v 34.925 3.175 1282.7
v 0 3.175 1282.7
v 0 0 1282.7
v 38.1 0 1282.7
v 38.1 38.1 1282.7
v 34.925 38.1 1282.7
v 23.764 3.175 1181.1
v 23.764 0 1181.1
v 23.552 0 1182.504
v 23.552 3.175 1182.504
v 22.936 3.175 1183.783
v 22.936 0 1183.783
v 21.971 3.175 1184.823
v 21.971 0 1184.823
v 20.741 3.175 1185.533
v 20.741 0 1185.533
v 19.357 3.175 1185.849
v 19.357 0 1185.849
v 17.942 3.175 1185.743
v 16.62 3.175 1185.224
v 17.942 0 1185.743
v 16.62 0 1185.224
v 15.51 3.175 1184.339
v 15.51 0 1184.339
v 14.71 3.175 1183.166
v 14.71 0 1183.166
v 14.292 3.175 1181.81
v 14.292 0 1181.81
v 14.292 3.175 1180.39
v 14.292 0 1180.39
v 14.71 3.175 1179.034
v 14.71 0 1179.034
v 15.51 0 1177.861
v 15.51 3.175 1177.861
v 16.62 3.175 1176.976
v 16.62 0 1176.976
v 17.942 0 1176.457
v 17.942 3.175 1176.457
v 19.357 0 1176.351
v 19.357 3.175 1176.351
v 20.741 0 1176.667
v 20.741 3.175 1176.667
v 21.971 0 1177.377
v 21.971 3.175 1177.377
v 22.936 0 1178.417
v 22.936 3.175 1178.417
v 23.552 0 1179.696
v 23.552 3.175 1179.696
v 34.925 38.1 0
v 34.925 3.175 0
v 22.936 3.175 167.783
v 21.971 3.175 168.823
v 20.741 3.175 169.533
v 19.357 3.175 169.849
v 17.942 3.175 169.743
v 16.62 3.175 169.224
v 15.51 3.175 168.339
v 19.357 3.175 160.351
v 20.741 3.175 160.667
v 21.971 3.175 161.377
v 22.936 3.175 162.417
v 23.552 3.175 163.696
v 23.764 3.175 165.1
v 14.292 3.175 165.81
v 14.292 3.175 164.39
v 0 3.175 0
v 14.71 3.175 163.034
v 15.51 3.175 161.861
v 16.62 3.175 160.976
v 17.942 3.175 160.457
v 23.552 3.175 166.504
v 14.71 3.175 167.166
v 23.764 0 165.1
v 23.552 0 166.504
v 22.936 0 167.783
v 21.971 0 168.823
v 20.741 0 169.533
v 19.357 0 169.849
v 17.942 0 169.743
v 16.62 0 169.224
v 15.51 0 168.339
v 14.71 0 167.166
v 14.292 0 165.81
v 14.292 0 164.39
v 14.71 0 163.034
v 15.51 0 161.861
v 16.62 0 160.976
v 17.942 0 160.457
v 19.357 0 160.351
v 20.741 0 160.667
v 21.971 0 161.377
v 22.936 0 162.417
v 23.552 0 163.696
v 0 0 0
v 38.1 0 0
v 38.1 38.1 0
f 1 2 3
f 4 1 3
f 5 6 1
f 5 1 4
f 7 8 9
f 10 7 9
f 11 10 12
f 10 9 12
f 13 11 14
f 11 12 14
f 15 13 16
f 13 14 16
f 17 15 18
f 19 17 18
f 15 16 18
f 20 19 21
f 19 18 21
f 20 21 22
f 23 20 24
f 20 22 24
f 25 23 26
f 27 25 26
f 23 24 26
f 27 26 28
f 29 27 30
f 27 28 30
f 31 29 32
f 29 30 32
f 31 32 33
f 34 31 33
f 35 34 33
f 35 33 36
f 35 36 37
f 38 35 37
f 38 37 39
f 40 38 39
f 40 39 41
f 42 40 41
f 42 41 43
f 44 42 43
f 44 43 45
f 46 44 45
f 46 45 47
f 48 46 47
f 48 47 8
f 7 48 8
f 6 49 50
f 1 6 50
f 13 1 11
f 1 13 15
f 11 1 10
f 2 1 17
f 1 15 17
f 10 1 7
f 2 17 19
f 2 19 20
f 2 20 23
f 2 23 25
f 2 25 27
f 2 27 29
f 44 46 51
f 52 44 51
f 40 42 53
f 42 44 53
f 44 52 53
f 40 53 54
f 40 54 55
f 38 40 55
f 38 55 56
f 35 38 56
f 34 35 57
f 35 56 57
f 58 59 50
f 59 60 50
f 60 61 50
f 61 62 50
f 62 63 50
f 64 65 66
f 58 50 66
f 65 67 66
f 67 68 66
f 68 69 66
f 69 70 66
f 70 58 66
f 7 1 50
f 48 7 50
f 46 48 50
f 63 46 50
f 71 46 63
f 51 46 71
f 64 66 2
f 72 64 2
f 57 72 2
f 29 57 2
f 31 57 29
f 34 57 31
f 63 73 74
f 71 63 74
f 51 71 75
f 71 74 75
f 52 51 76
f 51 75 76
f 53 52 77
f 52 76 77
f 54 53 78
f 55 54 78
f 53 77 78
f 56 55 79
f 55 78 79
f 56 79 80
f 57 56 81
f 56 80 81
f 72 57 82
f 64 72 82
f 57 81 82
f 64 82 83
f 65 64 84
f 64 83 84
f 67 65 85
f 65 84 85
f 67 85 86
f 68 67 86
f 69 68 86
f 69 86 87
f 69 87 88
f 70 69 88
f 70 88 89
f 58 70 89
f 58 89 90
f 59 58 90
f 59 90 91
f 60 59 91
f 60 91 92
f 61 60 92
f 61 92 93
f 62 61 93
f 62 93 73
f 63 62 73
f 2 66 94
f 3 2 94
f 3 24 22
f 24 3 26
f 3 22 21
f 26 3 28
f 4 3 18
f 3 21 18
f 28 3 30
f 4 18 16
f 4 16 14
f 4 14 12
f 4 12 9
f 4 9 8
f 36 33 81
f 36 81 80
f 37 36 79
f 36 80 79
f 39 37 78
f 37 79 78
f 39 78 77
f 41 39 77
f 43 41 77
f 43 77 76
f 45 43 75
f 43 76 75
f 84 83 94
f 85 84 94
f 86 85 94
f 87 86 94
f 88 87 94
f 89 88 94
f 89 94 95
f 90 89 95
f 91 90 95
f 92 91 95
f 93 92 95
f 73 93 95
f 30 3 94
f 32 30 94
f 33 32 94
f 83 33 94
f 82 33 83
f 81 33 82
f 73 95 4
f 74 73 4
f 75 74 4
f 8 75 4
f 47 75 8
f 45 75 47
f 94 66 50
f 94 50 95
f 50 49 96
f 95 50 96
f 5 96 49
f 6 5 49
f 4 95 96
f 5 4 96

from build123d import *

# Parameters (mm, degrees)
F1_DEPTH = 1282.7
F2_R     = 4.7625
F3_DEPTH = 38.101


with BuildPart() as f1:
    # F0 (on Top) → F1 (new body)
    with BuildSketch(Plane.XY):
        Polygon((0, 3.175), (0, 0), (38.1, 0), (38.1, 38.1), (34.925, 38.1), (34.925, 3.175), align=None)
    extrude(amount=F1_DEPTH)

    # F2 (on face) → F3 (cut, through all)
    with BuildSketch(Plane.XZ):
        with Locations((19.001344, 1181.1)):
            Circle(F2_R)
        with Locations((19.001344, 165.1)):
            Circle(F2_R)
    extrude(amount=-F3_DEPTH, mode=Mode.SUBTRACT)


solid = f1.part
